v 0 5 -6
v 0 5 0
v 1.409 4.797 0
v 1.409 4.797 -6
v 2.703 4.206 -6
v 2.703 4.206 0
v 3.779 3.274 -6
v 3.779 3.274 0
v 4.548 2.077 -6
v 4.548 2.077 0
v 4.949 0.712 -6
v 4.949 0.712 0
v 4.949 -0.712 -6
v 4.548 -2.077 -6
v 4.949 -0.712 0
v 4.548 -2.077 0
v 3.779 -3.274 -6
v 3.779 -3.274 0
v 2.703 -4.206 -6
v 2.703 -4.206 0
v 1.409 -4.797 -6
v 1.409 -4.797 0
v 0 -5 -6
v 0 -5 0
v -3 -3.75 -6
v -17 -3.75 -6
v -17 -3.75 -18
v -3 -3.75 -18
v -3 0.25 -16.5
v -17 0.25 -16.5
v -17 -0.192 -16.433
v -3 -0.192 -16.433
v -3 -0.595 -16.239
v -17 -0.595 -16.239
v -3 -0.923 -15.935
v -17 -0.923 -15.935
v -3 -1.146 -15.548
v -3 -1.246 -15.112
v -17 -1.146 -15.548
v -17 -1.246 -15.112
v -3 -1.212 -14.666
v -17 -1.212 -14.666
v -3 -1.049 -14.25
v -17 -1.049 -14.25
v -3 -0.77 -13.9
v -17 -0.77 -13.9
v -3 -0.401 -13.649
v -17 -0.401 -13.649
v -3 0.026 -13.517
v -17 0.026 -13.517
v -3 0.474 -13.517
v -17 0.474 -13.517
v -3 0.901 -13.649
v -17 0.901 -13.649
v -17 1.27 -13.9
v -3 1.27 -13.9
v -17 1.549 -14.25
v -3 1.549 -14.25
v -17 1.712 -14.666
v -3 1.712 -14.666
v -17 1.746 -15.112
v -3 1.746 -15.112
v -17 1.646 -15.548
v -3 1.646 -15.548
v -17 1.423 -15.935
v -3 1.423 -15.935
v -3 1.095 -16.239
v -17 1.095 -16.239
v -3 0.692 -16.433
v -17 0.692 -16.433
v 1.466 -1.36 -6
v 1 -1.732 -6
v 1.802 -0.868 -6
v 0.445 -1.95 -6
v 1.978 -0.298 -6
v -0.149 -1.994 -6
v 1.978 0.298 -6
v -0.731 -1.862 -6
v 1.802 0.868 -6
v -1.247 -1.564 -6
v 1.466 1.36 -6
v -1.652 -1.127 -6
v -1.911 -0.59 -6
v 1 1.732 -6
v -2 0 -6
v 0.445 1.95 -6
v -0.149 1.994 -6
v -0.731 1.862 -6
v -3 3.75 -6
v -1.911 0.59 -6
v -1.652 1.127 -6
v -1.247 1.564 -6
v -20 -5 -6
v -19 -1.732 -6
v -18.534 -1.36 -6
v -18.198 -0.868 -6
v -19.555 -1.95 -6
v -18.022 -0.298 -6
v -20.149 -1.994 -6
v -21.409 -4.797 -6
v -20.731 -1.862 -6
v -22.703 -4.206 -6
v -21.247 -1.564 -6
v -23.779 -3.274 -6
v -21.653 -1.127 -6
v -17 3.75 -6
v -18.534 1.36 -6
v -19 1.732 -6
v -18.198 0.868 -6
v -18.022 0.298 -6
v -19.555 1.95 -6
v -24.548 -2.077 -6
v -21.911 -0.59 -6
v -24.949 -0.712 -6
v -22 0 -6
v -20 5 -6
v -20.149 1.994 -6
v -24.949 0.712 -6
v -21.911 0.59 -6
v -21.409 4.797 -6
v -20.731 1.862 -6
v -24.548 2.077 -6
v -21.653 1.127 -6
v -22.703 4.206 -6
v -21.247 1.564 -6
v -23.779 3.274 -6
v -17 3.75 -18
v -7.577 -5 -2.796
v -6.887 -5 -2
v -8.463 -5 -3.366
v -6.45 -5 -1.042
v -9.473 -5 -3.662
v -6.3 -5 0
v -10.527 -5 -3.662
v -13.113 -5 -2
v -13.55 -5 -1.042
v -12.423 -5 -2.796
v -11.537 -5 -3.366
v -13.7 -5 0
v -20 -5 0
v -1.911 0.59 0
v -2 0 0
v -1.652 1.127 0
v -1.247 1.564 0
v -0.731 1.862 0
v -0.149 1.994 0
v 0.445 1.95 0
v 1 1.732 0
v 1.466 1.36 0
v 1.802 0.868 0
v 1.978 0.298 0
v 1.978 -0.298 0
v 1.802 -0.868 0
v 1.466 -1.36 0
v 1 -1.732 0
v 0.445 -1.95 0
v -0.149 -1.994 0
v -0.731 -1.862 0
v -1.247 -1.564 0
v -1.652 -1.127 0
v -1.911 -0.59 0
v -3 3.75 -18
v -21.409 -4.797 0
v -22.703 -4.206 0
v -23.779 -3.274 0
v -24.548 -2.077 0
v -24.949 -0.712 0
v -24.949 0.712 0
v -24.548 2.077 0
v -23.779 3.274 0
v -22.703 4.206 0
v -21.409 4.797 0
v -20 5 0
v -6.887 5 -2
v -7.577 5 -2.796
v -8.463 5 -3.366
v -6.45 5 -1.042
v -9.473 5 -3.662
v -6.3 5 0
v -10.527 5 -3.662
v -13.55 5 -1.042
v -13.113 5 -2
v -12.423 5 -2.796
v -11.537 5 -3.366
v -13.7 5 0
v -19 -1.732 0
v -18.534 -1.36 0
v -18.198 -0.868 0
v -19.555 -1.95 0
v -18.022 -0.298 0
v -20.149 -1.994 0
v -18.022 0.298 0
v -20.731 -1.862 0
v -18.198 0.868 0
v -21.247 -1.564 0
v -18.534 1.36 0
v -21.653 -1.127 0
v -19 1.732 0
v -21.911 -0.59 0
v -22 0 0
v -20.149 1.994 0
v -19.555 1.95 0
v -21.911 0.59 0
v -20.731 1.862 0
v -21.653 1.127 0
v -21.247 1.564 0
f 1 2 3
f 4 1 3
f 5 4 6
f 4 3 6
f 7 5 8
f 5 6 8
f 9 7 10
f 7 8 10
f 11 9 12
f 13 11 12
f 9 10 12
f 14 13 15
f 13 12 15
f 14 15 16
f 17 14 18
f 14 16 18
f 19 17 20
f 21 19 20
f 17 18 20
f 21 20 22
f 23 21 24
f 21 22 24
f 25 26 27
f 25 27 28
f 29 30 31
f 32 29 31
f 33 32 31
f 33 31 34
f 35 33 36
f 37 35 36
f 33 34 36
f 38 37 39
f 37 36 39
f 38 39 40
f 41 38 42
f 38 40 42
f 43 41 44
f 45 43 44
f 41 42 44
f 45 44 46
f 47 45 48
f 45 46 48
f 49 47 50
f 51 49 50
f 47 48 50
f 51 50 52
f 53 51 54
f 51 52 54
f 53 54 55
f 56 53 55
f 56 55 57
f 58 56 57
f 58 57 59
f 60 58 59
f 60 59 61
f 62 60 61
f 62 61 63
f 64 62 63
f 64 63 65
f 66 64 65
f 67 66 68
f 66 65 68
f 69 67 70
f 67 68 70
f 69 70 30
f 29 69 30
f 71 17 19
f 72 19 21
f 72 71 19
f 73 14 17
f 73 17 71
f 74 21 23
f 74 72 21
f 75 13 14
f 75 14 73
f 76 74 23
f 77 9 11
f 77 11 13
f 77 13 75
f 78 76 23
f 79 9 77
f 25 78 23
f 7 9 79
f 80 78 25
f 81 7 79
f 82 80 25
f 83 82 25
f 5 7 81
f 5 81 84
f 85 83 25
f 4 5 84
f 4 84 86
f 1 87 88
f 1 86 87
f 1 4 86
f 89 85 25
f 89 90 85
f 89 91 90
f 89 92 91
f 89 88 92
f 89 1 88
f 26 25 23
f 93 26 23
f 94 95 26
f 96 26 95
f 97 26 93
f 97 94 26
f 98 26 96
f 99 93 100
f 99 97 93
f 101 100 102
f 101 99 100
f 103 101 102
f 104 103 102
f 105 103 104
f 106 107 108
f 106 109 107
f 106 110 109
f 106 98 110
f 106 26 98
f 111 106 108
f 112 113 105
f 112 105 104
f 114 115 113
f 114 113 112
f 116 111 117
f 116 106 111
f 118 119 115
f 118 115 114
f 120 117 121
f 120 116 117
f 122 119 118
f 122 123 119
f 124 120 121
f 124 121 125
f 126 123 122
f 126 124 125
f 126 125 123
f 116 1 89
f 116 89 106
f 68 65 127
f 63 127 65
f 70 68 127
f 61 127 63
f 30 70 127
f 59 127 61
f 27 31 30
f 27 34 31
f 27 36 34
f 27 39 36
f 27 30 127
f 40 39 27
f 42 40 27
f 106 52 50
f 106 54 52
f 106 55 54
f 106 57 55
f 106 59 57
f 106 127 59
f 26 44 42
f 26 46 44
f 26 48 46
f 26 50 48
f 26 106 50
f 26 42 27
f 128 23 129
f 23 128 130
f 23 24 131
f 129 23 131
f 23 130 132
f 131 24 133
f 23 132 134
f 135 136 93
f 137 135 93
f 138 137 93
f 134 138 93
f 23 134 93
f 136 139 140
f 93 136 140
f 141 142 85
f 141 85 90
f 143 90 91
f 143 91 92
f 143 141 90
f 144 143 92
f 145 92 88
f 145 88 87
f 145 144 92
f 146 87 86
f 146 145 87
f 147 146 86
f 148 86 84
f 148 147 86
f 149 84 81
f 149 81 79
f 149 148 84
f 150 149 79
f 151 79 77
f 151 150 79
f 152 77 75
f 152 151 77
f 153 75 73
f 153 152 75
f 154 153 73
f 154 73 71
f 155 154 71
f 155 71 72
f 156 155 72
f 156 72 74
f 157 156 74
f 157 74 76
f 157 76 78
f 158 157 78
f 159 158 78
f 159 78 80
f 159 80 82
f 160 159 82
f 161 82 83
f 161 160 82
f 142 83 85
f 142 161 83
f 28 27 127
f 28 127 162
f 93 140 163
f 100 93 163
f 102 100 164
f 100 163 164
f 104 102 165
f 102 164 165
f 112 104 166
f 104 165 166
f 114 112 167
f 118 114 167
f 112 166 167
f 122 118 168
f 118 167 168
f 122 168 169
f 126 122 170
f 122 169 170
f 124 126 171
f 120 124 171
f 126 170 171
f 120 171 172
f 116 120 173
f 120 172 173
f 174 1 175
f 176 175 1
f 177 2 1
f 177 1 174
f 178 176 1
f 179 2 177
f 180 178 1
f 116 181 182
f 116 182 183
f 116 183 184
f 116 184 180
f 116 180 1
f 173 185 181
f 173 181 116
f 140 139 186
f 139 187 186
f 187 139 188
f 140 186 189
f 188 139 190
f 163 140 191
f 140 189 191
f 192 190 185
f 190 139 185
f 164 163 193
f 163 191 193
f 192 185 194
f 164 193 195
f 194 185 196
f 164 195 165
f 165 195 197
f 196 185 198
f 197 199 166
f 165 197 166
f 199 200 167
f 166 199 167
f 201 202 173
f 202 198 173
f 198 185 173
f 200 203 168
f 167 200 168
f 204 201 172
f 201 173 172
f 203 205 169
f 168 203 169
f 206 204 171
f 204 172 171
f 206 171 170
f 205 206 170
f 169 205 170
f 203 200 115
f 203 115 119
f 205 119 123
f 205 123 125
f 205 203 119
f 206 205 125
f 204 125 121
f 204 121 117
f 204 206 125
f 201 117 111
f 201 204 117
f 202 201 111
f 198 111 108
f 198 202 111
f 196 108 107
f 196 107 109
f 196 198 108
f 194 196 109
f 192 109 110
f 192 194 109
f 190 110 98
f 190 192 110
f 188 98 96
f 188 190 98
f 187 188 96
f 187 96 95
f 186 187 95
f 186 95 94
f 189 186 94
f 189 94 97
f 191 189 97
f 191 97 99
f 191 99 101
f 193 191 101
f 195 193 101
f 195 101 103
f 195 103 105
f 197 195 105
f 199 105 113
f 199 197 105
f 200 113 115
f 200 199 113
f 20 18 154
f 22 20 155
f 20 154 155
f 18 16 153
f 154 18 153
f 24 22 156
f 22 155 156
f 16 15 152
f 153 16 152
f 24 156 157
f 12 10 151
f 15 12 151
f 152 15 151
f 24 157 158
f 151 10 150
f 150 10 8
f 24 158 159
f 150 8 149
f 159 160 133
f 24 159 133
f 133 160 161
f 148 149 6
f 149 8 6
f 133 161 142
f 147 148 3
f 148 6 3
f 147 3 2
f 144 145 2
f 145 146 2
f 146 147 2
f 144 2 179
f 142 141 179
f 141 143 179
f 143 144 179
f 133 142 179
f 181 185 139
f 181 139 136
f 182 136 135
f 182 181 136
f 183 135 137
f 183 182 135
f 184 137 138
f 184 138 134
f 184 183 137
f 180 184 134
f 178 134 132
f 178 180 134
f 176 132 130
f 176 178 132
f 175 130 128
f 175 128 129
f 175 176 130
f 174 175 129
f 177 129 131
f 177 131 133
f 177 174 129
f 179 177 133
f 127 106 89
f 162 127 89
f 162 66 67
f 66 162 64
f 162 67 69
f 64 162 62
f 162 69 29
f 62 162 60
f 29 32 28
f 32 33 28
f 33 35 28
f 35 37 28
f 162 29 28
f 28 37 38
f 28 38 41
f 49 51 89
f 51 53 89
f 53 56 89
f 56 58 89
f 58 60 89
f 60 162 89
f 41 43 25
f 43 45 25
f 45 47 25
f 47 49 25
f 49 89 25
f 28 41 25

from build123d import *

# Parameters (mm, degrees)
SKETCH_R             = 2
PAD_DEPTH            = 6
CYLINDER_R           = 3.7
CYLINDER_DEPTH       = 10
SKETCH001_W          = 14
SKETCH001_H          = 7.5
PAD001_DEPTH         = 12
SKETCH002_R          = 1.5
POCKET_DEPTH         = 14
BODY_PLACEMENT_ANGLE = 180


with BuildPart() as part:
    # Sketch → Pad (new body)
    with BuildSketch(Plane.XY):
        with BuildLine():
            ThreePointArc((2.9e-05, 5), (-5, 1e-05), (1e-05, -5))
            Line((1e-05, -5), (20.00001, -5))
            ThreePointArc((20.00001, -5), (25.000039, -1e-05), (20.000029, 5))
            Line((2.9e-05, 5), (20.000029, 5))
        make_face()
        Circle(SKETCH_R, mode=Mode.SUBTRACT)
        with Locations((20.000039, 0)):
            Circle(SKETCH_R, mode=Mode.SUBTRACT)
    extrude(amount=PAD_DEPTH)

    # Cylinder → Cylinder (cut)
    with BuildSketch(Plane(origin=(10, 5, 0), x_dir=(1, 0, 0), z_dir=(0, -1, 0))):
        Circle(CYLINDER_R)
    extrude(amount=CYLINDER_DEPTH, mode=Mode.SUBTRACT)

    # Sketch001 (on Face5 of Cylinder) → Pad001 (join)
    with BuildSketch(Plane(origin=(10, 5, 6), x_dir=(-1, 0, 0), z_dir=(0, 0, 1))):
        with Locations((0, 5)):
            Rectangle(SKETCH001_W, SKETCH001_H)
    extrude(amount=PAD001_DEPTH)

    # Sketch002 (on Face10 of Pad001) → Pocket (cut)
    with BuildSketch(Plane(origin=(17, 5, 0), x_dir=(0, 0, 1), z_dir=(1, 0, 0))):
        with Locations((15, 4.75)):
            Circle(SKETCH002_R)
    extrude(amount=-POCKET_DEPTH, mode=Mode.SUBTRACT)


with BuildPart() as part_1:
    # Body placement: moved
    add(part.part.rotate(Axis((0, 0, 0), (0, 1, 0)), BODY_PLACEMENT_ANGLE))


solid = part_1.part
